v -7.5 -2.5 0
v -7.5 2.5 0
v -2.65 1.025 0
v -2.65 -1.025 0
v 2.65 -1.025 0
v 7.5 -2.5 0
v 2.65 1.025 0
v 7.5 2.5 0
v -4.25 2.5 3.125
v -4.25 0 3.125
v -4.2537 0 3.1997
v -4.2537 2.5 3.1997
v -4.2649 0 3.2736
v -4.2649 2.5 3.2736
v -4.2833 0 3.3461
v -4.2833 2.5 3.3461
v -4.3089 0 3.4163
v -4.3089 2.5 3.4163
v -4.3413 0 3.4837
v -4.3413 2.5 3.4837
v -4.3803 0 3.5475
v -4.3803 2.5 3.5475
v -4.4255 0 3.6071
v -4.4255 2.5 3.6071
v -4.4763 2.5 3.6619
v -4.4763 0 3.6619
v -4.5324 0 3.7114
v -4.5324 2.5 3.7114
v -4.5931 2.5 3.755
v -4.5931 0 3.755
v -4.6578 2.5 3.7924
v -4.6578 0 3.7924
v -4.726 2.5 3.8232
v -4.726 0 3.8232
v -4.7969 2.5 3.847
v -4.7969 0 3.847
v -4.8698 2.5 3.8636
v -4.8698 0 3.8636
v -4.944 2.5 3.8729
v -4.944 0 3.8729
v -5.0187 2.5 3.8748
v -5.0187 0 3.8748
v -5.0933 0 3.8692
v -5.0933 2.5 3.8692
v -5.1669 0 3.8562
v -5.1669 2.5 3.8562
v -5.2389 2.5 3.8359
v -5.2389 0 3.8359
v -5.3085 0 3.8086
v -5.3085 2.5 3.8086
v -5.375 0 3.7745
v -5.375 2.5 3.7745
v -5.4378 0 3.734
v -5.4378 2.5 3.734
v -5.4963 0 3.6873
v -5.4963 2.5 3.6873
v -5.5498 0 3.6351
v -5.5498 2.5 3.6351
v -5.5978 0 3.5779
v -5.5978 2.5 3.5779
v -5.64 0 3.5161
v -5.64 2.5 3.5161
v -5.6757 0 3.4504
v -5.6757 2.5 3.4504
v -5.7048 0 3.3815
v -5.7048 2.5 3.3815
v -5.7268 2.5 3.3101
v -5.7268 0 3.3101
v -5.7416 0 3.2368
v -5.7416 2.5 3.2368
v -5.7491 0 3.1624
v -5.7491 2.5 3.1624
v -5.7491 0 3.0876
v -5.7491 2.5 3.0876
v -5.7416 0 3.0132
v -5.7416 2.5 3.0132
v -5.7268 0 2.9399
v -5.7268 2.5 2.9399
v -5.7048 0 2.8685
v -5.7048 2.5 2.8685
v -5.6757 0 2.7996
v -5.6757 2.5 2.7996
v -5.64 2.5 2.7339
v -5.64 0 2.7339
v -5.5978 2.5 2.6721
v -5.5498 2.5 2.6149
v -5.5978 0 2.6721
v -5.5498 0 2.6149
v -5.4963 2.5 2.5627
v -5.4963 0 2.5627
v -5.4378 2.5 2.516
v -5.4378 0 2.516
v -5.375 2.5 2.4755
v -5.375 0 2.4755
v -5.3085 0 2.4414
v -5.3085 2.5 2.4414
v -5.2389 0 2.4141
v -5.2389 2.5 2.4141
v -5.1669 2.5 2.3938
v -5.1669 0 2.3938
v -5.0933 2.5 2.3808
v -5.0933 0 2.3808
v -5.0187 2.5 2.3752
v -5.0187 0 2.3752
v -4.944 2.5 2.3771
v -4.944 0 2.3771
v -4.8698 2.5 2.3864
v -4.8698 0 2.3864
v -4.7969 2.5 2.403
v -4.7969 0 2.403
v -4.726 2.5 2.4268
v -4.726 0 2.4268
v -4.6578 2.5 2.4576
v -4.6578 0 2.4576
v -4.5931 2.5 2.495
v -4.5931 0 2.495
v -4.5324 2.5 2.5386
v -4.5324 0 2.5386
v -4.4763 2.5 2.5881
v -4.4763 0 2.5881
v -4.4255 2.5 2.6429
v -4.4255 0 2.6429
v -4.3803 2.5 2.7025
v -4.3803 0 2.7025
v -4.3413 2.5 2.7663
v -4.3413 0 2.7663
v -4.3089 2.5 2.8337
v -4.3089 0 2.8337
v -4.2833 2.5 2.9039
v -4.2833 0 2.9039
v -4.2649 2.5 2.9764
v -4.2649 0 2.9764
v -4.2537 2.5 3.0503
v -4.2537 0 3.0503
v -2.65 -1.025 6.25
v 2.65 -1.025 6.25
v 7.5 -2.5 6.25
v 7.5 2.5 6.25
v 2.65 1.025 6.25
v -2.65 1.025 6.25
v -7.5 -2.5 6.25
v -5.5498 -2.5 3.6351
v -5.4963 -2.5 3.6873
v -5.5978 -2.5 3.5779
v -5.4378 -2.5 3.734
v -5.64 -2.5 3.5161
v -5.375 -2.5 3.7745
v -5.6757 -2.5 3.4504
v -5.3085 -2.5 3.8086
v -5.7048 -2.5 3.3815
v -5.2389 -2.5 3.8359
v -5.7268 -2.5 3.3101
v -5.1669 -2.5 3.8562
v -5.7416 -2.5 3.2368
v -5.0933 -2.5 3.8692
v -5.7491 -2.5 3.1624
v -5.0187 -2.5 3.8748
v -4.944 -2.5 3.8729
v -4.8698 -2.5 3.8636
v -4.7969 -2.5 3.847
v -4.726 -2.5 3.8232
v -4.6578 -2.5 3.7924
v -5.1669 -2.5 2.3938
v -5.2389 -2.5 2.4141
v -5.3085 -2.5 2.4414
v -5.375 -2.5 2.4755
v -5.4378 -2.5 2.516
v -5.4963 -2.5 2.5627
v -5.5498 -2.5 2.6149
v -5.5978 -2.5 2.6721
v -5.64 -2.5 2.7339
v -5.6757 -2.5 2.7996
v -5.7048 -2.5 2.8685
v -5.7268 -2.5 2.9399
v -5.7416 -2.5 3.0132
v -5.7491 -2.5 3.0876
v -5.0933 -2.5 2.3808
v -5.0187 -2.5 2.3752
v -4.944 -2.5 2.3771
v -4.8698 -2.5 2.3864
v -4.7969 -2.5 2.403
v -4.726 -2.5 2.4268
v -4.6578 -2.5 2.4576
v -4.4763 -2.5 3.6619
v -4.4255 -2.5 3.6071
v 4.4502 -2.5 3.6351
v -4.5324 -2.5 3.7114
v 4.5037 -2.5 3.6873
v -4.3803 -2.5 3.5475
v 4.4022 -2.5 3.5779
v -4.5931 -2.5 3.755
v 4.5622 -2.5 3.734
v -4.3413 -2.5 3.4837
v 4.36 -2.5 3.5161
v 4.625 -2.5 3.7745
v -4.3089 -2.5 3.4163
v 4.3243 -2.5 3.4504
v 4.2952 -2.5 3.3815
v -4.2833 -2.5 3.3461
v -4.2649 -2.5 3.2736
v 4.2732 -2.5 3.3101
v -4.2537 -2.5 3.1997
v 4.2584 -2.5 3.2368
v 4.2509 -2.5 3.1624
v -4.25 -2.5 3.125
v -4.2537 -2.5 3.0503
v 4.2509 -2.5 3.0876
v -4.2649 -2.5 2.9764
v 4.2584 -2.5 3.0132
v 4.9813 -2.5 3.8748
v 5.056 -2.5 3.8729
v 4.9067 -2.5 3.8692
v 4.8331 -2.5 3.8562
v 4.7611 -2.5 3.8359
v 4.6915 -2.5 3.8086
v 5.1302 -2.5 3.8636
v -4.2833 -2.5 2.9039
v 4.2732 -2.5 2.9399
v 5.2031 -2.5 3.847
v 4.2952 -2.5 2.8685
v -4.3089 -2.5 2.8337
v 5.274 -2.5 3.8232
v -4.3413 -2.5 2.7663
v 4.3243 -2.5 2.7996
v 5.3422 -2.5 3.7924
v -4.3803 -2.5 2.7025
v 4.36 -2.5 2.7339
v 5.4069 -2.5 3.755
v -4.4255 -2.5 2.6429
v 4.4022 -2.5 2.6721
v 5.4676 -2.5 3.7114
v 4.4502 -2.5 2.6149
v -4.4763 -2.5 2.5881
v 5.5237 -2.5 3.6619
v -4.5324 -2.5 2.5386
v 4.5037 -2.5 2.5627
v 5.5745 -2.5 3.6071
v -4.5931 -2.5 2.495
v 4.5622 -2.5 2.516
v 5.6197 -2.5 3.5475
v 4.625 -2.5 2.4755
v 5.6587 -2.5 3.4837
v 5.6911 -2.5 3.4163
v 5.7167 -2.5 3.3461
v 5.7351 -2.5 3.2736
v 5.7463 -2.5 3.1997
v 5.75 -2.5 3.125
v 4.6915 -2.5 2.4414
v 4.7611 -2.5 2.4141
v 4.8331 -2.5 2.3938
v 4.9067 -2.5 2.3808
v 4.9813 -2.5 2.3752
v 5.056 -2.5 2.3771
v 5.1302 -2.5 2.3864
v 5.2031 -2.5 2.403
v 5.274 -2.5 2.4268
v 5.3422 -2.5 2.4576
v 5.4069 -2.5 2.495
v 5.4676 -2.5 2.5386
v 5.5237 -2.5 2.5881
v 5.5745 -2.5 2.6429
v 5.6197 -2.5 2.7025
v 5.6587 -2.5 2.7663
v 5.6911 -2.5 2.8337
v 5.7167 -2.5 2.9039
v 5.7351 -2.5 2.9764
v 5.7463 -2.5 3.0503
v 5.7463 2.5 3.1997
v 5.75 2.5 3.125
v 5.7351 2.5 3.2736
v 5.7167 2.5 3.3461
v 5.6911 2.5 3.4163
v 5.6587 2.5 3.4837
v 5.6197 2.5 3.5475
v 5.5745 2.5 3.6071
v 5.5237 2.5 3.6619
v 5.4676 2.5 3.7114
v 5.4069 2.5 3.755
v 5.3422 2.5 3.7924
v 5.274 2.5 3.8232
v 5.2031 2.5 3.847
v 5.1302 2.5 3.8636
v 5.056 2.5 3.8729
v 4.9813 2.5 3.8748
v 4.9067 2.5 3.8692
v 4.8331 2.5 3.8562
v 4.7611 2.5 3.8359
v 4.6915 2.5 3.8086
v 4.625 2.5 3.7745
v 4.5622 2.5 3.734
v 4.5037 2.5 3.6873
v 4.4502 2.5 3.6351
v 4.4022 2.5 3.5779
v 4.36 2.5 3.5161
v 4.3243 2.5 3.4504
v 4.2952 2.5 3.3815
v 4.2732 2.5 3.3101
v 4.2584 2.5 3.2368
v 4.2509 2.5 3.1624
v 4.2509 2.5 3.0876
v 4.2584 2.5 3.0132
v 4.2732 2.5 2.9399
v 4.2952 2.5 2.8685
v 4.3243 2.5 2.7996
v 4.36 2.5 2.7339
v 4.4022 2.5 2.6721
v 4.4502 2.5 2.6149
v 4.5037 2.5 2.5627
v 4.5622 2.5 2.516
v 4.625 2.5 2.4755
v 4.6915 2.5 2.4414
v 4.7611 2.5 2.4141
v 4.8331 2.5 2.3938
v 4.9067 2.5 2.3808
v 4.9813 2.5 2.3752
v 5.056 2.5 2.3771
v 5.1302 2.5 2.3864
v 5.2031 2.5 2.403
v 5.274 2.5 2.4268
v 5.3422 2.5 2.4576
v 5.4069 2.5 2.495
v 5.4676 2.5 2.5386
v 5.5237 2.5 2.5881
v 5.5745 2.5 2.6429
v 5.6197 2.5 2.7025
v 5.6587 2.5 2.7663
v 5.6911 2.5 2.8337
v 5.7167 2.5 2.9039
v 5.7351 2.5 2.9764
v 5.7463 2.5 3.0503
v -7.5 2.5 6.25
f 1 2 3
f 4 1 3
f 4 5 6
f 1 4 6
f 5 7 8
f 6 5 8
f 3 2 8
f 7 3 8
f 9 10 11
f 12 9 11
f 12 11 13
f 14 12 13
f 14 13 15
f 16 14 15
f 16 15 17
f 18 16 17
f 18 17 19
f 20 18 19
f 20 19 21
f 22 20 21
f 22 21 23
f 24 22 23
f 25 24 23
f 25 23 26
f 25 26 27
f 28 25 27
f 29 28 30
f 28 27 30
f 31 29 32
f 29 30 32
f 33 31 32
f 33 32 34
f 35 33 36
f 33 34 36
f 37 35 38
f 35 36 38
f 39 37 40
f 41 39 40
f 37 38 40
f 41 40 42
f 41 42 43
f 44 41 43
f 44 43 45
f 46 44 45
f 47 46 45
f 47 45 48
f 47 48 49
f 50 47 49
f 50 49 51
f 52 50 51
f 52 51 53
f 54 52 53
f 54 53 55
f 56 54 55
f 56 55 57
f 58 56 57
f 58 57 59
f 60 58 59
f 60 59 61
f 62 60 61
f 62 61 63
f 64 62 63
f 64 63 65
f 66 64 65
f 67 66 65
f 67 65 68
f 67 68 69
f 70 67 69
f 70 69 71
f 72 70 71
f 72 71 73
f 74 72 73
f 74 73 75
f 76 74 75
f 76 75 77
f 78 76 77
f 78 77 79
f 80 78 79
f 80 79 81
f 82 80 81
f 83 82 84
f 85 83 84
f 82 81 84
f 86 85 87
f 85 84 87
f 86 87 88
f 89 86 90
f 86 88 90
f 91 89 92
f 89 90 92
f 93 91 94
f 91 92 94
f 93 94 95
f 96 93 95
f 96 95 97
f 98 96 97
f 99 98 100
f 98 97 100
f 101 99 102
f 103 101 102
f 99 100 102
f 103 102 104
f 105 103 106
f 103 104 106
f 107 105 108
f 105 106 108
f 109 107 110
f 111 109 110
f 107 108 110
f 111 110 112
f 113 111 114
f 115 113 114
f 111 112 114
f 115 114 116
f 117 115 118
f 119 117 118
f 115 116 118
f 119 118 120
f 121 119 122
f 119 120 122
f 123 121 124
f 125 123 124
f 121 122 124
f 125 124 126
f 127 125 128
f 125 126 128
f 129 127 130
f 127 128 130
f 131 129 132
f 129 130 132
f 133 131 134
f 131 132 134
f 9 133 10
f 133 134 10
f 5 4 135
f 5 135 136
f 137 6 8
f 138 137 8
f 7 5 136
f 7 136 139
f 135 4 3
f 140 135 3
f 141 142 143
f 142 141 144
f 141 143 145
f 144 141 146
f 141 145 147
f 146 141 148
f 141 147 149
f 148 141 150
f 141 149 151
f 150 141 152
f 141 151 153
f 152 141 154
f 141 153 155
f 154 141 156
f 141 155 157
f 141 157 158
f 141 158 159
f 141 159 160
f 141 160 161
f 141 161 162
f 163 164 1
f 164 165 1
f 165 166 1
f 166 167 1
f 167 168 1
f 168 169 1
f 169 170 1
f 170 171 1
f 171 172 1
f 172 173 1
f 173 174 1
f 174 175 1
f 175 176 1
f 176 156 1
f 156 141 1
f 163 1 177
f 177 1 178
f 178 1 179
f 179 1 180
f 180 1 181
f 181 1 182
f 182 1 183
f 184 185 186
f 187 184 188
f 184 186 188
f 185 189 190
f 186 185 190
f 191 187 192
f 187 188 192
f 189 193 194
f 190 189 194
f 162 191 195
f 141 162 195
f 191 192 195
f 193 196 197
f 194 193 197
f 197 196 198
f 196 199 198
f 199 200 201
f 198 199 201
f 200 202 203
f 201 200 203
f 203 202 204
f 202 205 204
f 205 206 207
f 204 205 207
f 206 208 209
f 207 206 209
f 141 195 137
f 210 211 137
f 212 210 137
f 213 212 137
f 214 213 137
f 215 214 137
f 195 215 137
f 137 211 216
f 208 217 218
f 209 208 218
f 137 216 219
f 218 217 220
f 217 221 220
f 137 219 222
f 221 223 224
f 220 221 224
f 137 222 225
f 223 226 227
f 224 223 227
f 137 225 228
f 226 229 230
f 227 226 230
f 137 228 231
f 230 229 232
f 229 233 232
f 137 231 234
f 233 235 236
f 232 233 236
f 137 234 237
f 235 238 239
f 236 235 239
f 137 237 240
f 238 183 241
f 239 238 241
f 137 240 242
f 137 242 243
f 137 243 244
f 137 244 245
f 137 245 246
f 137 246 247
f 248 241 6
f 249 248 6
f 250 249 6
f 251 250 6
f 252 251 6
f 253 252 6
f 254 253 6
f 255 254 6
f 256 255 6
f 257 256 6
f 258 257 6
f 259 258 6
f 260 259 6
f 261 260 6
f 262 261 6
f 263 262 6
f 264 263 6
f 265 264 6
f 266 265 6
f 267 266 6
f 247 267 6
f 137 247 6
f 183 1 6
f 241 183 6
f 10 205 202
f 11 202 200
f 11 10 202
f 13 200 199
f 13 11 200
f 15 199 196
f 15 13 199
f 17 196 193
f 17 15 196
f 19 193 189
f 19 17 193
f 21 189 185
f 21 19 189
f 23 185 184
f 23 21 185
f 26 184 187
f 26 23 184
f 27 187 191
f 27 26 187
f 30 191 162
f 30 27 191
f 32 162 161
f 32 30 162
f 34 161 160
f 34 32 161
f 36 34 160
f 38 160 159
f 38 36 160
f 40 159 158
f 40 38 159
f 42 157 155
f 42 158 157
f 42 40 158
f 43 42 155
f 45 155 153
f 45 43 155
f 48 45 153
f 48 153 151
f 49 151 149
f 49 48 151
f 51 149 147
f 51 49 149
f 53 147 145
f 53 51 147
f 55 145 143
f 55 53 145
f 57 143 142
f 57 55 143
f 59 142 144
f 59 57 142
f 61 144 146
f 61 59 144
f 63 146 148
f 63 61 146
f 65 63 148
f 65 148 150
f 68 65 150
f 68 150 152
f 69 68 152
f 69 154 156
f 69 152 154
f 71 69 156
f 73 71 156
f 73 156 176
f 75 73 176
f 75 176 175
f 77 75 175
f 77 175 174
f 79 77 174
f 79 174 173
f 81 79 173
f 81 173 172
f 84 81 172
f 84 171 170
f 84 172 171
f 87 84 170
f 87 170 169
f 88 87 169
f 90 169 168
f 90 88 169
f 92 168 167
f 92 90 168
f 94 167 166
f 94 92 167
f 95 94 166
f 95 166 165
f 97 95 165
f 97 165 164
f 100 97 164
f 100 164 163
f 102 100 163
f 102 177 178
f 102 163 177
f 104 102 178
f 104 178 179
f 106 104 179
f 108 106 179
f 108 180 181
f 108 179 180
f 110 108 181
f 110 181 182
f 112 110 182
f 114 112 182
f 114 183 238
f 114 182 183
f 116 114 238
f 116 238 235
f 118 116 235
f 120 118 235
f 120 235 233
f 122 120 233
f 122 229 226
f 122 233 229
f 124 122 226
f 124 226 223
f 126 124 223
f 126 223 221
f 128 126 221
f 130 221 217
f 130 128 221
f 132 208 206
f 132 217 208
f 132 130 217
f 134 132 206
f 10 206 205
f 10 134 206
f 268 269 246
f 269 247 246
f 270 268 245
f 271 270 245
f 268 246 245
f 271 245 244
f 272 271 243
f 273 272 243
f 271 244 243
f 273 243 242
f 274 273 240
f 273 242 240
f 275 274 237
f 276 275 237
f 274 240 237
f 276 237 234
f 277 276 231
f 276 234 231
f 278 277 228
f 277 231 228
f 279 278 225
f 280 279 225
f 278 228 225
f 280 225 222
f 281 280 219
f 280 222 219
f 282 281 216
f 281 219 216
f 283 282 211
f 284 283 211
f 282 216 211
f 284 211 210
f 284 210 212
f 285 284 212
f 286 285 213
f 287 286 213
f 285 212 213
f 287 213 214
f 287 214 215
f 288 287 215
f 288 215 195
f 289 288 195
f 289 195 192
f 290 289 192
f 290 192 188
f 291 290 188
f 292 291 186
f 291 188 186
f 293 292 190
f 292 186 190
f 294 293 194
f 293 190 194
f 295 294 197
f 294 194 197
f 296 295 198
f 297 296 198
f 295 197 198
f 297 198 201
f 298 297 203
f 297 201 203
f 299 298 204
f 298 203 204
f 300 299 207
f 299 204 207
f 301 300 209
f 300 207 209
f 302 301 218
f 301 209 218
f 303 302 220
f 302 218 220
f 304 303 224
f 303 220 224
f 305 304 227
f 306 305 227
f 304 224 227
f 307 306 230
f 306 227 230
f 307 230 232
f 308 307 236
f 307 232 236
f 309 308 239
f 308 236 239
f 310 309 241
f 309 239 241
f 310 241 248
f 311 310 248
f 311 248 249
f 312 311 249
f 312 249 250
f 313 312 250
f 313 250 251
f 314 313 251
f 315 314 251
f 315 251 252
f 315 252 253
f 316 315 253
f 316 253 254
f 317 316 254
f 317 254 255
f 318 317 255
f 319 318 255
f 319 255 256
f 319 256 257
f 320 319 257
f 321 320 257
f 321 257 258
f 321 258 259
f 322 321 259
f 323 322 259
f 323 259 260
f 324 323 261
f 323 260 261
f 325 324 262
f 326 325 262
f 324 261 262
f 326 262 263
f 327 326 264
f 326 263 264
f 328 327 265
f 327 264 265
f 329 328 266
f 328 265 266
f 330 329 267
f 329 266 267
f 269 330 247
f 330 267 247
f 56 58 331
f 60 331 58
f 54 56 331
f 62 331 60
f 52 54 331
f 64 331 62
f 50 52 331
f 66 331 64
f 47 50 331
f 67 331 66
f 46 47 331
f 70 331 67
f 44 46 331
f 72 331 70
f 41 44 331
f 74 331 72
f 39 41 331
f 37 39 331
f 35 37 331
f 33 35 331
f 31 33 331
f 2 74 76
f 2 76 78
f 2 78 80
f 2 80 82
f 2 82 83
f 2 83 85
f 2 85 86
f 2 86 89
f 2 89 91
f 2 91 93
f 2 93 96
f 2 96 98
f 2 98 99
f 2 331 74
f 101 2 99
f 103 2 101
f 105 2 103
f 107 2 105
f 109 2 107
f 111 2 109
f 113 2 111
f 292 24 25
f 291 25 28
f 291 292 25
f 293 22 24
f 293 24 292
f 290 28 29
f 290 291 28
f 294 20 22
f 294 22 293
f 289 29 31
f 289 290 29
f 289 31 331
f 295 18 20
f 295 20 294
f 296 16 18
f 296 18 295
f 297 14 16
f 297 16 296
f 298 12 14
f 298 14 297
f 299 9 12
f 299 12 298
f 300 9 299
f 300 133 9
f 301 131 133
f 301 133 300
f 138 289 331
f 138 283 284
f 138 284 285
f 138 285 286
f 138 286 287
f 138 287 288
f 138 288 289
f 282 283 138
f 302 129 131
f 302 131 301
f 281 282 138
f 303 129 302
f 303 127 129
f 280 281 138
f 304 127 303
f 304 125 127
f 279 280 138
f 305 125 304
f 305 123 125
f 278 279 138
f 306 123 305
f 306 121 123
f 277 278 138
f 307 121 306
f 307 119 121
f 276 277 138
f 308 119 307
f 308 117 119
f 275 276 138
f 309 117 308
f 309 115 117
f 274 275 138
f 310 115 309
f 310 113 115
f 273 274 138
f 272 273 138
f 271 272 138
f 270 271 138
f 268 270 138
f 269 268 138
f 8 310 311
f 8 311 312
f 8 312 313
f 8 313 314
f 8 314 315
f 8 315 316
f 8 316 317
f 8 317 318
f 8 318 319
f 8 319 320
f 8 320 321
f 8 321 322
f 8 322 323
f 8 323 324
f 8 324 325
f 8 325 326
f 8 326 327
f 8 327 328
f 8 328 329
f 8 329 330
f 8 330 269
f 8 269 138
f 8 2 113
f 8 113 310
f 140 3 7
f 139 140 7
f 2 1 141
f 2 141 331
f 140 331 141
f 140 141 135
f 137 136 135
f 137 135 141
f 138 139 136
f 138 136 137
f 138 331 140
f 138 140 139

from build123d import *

# Parameters (mm, degrees)
F0_W     = 15
F0_H     = 5
F0_W_2   = 5.3
F0_H_2   = 2.05
F1_DEPTH = 6.25
F2_R     = 0.75
F3_DEPTH = 3.9


with BuildPart() as f1:
    # F0 (on Top) → F1 (new body)
    with BuildSketch(Plane.XY):
        Rectangle(F0_W, F0_H)
        Rectangle(F0_W_2, F0_H_2, mode=Mode.SUBTRACT)
    extrude(amount=F1_DEPTH)

    # F2 (on Front) → F3 (cut, symmetric)
    with BuildSketch(Plane.XZ):
        with Locations((-5, 3.125)):
            Circle(F2_R)
        with Locations((5, 3.125)):
            Circle(F2_R)
    extrude(amount=F3_DEPTH, both=True, mode=Mode.SUBTRACT)


solid = f1.part
